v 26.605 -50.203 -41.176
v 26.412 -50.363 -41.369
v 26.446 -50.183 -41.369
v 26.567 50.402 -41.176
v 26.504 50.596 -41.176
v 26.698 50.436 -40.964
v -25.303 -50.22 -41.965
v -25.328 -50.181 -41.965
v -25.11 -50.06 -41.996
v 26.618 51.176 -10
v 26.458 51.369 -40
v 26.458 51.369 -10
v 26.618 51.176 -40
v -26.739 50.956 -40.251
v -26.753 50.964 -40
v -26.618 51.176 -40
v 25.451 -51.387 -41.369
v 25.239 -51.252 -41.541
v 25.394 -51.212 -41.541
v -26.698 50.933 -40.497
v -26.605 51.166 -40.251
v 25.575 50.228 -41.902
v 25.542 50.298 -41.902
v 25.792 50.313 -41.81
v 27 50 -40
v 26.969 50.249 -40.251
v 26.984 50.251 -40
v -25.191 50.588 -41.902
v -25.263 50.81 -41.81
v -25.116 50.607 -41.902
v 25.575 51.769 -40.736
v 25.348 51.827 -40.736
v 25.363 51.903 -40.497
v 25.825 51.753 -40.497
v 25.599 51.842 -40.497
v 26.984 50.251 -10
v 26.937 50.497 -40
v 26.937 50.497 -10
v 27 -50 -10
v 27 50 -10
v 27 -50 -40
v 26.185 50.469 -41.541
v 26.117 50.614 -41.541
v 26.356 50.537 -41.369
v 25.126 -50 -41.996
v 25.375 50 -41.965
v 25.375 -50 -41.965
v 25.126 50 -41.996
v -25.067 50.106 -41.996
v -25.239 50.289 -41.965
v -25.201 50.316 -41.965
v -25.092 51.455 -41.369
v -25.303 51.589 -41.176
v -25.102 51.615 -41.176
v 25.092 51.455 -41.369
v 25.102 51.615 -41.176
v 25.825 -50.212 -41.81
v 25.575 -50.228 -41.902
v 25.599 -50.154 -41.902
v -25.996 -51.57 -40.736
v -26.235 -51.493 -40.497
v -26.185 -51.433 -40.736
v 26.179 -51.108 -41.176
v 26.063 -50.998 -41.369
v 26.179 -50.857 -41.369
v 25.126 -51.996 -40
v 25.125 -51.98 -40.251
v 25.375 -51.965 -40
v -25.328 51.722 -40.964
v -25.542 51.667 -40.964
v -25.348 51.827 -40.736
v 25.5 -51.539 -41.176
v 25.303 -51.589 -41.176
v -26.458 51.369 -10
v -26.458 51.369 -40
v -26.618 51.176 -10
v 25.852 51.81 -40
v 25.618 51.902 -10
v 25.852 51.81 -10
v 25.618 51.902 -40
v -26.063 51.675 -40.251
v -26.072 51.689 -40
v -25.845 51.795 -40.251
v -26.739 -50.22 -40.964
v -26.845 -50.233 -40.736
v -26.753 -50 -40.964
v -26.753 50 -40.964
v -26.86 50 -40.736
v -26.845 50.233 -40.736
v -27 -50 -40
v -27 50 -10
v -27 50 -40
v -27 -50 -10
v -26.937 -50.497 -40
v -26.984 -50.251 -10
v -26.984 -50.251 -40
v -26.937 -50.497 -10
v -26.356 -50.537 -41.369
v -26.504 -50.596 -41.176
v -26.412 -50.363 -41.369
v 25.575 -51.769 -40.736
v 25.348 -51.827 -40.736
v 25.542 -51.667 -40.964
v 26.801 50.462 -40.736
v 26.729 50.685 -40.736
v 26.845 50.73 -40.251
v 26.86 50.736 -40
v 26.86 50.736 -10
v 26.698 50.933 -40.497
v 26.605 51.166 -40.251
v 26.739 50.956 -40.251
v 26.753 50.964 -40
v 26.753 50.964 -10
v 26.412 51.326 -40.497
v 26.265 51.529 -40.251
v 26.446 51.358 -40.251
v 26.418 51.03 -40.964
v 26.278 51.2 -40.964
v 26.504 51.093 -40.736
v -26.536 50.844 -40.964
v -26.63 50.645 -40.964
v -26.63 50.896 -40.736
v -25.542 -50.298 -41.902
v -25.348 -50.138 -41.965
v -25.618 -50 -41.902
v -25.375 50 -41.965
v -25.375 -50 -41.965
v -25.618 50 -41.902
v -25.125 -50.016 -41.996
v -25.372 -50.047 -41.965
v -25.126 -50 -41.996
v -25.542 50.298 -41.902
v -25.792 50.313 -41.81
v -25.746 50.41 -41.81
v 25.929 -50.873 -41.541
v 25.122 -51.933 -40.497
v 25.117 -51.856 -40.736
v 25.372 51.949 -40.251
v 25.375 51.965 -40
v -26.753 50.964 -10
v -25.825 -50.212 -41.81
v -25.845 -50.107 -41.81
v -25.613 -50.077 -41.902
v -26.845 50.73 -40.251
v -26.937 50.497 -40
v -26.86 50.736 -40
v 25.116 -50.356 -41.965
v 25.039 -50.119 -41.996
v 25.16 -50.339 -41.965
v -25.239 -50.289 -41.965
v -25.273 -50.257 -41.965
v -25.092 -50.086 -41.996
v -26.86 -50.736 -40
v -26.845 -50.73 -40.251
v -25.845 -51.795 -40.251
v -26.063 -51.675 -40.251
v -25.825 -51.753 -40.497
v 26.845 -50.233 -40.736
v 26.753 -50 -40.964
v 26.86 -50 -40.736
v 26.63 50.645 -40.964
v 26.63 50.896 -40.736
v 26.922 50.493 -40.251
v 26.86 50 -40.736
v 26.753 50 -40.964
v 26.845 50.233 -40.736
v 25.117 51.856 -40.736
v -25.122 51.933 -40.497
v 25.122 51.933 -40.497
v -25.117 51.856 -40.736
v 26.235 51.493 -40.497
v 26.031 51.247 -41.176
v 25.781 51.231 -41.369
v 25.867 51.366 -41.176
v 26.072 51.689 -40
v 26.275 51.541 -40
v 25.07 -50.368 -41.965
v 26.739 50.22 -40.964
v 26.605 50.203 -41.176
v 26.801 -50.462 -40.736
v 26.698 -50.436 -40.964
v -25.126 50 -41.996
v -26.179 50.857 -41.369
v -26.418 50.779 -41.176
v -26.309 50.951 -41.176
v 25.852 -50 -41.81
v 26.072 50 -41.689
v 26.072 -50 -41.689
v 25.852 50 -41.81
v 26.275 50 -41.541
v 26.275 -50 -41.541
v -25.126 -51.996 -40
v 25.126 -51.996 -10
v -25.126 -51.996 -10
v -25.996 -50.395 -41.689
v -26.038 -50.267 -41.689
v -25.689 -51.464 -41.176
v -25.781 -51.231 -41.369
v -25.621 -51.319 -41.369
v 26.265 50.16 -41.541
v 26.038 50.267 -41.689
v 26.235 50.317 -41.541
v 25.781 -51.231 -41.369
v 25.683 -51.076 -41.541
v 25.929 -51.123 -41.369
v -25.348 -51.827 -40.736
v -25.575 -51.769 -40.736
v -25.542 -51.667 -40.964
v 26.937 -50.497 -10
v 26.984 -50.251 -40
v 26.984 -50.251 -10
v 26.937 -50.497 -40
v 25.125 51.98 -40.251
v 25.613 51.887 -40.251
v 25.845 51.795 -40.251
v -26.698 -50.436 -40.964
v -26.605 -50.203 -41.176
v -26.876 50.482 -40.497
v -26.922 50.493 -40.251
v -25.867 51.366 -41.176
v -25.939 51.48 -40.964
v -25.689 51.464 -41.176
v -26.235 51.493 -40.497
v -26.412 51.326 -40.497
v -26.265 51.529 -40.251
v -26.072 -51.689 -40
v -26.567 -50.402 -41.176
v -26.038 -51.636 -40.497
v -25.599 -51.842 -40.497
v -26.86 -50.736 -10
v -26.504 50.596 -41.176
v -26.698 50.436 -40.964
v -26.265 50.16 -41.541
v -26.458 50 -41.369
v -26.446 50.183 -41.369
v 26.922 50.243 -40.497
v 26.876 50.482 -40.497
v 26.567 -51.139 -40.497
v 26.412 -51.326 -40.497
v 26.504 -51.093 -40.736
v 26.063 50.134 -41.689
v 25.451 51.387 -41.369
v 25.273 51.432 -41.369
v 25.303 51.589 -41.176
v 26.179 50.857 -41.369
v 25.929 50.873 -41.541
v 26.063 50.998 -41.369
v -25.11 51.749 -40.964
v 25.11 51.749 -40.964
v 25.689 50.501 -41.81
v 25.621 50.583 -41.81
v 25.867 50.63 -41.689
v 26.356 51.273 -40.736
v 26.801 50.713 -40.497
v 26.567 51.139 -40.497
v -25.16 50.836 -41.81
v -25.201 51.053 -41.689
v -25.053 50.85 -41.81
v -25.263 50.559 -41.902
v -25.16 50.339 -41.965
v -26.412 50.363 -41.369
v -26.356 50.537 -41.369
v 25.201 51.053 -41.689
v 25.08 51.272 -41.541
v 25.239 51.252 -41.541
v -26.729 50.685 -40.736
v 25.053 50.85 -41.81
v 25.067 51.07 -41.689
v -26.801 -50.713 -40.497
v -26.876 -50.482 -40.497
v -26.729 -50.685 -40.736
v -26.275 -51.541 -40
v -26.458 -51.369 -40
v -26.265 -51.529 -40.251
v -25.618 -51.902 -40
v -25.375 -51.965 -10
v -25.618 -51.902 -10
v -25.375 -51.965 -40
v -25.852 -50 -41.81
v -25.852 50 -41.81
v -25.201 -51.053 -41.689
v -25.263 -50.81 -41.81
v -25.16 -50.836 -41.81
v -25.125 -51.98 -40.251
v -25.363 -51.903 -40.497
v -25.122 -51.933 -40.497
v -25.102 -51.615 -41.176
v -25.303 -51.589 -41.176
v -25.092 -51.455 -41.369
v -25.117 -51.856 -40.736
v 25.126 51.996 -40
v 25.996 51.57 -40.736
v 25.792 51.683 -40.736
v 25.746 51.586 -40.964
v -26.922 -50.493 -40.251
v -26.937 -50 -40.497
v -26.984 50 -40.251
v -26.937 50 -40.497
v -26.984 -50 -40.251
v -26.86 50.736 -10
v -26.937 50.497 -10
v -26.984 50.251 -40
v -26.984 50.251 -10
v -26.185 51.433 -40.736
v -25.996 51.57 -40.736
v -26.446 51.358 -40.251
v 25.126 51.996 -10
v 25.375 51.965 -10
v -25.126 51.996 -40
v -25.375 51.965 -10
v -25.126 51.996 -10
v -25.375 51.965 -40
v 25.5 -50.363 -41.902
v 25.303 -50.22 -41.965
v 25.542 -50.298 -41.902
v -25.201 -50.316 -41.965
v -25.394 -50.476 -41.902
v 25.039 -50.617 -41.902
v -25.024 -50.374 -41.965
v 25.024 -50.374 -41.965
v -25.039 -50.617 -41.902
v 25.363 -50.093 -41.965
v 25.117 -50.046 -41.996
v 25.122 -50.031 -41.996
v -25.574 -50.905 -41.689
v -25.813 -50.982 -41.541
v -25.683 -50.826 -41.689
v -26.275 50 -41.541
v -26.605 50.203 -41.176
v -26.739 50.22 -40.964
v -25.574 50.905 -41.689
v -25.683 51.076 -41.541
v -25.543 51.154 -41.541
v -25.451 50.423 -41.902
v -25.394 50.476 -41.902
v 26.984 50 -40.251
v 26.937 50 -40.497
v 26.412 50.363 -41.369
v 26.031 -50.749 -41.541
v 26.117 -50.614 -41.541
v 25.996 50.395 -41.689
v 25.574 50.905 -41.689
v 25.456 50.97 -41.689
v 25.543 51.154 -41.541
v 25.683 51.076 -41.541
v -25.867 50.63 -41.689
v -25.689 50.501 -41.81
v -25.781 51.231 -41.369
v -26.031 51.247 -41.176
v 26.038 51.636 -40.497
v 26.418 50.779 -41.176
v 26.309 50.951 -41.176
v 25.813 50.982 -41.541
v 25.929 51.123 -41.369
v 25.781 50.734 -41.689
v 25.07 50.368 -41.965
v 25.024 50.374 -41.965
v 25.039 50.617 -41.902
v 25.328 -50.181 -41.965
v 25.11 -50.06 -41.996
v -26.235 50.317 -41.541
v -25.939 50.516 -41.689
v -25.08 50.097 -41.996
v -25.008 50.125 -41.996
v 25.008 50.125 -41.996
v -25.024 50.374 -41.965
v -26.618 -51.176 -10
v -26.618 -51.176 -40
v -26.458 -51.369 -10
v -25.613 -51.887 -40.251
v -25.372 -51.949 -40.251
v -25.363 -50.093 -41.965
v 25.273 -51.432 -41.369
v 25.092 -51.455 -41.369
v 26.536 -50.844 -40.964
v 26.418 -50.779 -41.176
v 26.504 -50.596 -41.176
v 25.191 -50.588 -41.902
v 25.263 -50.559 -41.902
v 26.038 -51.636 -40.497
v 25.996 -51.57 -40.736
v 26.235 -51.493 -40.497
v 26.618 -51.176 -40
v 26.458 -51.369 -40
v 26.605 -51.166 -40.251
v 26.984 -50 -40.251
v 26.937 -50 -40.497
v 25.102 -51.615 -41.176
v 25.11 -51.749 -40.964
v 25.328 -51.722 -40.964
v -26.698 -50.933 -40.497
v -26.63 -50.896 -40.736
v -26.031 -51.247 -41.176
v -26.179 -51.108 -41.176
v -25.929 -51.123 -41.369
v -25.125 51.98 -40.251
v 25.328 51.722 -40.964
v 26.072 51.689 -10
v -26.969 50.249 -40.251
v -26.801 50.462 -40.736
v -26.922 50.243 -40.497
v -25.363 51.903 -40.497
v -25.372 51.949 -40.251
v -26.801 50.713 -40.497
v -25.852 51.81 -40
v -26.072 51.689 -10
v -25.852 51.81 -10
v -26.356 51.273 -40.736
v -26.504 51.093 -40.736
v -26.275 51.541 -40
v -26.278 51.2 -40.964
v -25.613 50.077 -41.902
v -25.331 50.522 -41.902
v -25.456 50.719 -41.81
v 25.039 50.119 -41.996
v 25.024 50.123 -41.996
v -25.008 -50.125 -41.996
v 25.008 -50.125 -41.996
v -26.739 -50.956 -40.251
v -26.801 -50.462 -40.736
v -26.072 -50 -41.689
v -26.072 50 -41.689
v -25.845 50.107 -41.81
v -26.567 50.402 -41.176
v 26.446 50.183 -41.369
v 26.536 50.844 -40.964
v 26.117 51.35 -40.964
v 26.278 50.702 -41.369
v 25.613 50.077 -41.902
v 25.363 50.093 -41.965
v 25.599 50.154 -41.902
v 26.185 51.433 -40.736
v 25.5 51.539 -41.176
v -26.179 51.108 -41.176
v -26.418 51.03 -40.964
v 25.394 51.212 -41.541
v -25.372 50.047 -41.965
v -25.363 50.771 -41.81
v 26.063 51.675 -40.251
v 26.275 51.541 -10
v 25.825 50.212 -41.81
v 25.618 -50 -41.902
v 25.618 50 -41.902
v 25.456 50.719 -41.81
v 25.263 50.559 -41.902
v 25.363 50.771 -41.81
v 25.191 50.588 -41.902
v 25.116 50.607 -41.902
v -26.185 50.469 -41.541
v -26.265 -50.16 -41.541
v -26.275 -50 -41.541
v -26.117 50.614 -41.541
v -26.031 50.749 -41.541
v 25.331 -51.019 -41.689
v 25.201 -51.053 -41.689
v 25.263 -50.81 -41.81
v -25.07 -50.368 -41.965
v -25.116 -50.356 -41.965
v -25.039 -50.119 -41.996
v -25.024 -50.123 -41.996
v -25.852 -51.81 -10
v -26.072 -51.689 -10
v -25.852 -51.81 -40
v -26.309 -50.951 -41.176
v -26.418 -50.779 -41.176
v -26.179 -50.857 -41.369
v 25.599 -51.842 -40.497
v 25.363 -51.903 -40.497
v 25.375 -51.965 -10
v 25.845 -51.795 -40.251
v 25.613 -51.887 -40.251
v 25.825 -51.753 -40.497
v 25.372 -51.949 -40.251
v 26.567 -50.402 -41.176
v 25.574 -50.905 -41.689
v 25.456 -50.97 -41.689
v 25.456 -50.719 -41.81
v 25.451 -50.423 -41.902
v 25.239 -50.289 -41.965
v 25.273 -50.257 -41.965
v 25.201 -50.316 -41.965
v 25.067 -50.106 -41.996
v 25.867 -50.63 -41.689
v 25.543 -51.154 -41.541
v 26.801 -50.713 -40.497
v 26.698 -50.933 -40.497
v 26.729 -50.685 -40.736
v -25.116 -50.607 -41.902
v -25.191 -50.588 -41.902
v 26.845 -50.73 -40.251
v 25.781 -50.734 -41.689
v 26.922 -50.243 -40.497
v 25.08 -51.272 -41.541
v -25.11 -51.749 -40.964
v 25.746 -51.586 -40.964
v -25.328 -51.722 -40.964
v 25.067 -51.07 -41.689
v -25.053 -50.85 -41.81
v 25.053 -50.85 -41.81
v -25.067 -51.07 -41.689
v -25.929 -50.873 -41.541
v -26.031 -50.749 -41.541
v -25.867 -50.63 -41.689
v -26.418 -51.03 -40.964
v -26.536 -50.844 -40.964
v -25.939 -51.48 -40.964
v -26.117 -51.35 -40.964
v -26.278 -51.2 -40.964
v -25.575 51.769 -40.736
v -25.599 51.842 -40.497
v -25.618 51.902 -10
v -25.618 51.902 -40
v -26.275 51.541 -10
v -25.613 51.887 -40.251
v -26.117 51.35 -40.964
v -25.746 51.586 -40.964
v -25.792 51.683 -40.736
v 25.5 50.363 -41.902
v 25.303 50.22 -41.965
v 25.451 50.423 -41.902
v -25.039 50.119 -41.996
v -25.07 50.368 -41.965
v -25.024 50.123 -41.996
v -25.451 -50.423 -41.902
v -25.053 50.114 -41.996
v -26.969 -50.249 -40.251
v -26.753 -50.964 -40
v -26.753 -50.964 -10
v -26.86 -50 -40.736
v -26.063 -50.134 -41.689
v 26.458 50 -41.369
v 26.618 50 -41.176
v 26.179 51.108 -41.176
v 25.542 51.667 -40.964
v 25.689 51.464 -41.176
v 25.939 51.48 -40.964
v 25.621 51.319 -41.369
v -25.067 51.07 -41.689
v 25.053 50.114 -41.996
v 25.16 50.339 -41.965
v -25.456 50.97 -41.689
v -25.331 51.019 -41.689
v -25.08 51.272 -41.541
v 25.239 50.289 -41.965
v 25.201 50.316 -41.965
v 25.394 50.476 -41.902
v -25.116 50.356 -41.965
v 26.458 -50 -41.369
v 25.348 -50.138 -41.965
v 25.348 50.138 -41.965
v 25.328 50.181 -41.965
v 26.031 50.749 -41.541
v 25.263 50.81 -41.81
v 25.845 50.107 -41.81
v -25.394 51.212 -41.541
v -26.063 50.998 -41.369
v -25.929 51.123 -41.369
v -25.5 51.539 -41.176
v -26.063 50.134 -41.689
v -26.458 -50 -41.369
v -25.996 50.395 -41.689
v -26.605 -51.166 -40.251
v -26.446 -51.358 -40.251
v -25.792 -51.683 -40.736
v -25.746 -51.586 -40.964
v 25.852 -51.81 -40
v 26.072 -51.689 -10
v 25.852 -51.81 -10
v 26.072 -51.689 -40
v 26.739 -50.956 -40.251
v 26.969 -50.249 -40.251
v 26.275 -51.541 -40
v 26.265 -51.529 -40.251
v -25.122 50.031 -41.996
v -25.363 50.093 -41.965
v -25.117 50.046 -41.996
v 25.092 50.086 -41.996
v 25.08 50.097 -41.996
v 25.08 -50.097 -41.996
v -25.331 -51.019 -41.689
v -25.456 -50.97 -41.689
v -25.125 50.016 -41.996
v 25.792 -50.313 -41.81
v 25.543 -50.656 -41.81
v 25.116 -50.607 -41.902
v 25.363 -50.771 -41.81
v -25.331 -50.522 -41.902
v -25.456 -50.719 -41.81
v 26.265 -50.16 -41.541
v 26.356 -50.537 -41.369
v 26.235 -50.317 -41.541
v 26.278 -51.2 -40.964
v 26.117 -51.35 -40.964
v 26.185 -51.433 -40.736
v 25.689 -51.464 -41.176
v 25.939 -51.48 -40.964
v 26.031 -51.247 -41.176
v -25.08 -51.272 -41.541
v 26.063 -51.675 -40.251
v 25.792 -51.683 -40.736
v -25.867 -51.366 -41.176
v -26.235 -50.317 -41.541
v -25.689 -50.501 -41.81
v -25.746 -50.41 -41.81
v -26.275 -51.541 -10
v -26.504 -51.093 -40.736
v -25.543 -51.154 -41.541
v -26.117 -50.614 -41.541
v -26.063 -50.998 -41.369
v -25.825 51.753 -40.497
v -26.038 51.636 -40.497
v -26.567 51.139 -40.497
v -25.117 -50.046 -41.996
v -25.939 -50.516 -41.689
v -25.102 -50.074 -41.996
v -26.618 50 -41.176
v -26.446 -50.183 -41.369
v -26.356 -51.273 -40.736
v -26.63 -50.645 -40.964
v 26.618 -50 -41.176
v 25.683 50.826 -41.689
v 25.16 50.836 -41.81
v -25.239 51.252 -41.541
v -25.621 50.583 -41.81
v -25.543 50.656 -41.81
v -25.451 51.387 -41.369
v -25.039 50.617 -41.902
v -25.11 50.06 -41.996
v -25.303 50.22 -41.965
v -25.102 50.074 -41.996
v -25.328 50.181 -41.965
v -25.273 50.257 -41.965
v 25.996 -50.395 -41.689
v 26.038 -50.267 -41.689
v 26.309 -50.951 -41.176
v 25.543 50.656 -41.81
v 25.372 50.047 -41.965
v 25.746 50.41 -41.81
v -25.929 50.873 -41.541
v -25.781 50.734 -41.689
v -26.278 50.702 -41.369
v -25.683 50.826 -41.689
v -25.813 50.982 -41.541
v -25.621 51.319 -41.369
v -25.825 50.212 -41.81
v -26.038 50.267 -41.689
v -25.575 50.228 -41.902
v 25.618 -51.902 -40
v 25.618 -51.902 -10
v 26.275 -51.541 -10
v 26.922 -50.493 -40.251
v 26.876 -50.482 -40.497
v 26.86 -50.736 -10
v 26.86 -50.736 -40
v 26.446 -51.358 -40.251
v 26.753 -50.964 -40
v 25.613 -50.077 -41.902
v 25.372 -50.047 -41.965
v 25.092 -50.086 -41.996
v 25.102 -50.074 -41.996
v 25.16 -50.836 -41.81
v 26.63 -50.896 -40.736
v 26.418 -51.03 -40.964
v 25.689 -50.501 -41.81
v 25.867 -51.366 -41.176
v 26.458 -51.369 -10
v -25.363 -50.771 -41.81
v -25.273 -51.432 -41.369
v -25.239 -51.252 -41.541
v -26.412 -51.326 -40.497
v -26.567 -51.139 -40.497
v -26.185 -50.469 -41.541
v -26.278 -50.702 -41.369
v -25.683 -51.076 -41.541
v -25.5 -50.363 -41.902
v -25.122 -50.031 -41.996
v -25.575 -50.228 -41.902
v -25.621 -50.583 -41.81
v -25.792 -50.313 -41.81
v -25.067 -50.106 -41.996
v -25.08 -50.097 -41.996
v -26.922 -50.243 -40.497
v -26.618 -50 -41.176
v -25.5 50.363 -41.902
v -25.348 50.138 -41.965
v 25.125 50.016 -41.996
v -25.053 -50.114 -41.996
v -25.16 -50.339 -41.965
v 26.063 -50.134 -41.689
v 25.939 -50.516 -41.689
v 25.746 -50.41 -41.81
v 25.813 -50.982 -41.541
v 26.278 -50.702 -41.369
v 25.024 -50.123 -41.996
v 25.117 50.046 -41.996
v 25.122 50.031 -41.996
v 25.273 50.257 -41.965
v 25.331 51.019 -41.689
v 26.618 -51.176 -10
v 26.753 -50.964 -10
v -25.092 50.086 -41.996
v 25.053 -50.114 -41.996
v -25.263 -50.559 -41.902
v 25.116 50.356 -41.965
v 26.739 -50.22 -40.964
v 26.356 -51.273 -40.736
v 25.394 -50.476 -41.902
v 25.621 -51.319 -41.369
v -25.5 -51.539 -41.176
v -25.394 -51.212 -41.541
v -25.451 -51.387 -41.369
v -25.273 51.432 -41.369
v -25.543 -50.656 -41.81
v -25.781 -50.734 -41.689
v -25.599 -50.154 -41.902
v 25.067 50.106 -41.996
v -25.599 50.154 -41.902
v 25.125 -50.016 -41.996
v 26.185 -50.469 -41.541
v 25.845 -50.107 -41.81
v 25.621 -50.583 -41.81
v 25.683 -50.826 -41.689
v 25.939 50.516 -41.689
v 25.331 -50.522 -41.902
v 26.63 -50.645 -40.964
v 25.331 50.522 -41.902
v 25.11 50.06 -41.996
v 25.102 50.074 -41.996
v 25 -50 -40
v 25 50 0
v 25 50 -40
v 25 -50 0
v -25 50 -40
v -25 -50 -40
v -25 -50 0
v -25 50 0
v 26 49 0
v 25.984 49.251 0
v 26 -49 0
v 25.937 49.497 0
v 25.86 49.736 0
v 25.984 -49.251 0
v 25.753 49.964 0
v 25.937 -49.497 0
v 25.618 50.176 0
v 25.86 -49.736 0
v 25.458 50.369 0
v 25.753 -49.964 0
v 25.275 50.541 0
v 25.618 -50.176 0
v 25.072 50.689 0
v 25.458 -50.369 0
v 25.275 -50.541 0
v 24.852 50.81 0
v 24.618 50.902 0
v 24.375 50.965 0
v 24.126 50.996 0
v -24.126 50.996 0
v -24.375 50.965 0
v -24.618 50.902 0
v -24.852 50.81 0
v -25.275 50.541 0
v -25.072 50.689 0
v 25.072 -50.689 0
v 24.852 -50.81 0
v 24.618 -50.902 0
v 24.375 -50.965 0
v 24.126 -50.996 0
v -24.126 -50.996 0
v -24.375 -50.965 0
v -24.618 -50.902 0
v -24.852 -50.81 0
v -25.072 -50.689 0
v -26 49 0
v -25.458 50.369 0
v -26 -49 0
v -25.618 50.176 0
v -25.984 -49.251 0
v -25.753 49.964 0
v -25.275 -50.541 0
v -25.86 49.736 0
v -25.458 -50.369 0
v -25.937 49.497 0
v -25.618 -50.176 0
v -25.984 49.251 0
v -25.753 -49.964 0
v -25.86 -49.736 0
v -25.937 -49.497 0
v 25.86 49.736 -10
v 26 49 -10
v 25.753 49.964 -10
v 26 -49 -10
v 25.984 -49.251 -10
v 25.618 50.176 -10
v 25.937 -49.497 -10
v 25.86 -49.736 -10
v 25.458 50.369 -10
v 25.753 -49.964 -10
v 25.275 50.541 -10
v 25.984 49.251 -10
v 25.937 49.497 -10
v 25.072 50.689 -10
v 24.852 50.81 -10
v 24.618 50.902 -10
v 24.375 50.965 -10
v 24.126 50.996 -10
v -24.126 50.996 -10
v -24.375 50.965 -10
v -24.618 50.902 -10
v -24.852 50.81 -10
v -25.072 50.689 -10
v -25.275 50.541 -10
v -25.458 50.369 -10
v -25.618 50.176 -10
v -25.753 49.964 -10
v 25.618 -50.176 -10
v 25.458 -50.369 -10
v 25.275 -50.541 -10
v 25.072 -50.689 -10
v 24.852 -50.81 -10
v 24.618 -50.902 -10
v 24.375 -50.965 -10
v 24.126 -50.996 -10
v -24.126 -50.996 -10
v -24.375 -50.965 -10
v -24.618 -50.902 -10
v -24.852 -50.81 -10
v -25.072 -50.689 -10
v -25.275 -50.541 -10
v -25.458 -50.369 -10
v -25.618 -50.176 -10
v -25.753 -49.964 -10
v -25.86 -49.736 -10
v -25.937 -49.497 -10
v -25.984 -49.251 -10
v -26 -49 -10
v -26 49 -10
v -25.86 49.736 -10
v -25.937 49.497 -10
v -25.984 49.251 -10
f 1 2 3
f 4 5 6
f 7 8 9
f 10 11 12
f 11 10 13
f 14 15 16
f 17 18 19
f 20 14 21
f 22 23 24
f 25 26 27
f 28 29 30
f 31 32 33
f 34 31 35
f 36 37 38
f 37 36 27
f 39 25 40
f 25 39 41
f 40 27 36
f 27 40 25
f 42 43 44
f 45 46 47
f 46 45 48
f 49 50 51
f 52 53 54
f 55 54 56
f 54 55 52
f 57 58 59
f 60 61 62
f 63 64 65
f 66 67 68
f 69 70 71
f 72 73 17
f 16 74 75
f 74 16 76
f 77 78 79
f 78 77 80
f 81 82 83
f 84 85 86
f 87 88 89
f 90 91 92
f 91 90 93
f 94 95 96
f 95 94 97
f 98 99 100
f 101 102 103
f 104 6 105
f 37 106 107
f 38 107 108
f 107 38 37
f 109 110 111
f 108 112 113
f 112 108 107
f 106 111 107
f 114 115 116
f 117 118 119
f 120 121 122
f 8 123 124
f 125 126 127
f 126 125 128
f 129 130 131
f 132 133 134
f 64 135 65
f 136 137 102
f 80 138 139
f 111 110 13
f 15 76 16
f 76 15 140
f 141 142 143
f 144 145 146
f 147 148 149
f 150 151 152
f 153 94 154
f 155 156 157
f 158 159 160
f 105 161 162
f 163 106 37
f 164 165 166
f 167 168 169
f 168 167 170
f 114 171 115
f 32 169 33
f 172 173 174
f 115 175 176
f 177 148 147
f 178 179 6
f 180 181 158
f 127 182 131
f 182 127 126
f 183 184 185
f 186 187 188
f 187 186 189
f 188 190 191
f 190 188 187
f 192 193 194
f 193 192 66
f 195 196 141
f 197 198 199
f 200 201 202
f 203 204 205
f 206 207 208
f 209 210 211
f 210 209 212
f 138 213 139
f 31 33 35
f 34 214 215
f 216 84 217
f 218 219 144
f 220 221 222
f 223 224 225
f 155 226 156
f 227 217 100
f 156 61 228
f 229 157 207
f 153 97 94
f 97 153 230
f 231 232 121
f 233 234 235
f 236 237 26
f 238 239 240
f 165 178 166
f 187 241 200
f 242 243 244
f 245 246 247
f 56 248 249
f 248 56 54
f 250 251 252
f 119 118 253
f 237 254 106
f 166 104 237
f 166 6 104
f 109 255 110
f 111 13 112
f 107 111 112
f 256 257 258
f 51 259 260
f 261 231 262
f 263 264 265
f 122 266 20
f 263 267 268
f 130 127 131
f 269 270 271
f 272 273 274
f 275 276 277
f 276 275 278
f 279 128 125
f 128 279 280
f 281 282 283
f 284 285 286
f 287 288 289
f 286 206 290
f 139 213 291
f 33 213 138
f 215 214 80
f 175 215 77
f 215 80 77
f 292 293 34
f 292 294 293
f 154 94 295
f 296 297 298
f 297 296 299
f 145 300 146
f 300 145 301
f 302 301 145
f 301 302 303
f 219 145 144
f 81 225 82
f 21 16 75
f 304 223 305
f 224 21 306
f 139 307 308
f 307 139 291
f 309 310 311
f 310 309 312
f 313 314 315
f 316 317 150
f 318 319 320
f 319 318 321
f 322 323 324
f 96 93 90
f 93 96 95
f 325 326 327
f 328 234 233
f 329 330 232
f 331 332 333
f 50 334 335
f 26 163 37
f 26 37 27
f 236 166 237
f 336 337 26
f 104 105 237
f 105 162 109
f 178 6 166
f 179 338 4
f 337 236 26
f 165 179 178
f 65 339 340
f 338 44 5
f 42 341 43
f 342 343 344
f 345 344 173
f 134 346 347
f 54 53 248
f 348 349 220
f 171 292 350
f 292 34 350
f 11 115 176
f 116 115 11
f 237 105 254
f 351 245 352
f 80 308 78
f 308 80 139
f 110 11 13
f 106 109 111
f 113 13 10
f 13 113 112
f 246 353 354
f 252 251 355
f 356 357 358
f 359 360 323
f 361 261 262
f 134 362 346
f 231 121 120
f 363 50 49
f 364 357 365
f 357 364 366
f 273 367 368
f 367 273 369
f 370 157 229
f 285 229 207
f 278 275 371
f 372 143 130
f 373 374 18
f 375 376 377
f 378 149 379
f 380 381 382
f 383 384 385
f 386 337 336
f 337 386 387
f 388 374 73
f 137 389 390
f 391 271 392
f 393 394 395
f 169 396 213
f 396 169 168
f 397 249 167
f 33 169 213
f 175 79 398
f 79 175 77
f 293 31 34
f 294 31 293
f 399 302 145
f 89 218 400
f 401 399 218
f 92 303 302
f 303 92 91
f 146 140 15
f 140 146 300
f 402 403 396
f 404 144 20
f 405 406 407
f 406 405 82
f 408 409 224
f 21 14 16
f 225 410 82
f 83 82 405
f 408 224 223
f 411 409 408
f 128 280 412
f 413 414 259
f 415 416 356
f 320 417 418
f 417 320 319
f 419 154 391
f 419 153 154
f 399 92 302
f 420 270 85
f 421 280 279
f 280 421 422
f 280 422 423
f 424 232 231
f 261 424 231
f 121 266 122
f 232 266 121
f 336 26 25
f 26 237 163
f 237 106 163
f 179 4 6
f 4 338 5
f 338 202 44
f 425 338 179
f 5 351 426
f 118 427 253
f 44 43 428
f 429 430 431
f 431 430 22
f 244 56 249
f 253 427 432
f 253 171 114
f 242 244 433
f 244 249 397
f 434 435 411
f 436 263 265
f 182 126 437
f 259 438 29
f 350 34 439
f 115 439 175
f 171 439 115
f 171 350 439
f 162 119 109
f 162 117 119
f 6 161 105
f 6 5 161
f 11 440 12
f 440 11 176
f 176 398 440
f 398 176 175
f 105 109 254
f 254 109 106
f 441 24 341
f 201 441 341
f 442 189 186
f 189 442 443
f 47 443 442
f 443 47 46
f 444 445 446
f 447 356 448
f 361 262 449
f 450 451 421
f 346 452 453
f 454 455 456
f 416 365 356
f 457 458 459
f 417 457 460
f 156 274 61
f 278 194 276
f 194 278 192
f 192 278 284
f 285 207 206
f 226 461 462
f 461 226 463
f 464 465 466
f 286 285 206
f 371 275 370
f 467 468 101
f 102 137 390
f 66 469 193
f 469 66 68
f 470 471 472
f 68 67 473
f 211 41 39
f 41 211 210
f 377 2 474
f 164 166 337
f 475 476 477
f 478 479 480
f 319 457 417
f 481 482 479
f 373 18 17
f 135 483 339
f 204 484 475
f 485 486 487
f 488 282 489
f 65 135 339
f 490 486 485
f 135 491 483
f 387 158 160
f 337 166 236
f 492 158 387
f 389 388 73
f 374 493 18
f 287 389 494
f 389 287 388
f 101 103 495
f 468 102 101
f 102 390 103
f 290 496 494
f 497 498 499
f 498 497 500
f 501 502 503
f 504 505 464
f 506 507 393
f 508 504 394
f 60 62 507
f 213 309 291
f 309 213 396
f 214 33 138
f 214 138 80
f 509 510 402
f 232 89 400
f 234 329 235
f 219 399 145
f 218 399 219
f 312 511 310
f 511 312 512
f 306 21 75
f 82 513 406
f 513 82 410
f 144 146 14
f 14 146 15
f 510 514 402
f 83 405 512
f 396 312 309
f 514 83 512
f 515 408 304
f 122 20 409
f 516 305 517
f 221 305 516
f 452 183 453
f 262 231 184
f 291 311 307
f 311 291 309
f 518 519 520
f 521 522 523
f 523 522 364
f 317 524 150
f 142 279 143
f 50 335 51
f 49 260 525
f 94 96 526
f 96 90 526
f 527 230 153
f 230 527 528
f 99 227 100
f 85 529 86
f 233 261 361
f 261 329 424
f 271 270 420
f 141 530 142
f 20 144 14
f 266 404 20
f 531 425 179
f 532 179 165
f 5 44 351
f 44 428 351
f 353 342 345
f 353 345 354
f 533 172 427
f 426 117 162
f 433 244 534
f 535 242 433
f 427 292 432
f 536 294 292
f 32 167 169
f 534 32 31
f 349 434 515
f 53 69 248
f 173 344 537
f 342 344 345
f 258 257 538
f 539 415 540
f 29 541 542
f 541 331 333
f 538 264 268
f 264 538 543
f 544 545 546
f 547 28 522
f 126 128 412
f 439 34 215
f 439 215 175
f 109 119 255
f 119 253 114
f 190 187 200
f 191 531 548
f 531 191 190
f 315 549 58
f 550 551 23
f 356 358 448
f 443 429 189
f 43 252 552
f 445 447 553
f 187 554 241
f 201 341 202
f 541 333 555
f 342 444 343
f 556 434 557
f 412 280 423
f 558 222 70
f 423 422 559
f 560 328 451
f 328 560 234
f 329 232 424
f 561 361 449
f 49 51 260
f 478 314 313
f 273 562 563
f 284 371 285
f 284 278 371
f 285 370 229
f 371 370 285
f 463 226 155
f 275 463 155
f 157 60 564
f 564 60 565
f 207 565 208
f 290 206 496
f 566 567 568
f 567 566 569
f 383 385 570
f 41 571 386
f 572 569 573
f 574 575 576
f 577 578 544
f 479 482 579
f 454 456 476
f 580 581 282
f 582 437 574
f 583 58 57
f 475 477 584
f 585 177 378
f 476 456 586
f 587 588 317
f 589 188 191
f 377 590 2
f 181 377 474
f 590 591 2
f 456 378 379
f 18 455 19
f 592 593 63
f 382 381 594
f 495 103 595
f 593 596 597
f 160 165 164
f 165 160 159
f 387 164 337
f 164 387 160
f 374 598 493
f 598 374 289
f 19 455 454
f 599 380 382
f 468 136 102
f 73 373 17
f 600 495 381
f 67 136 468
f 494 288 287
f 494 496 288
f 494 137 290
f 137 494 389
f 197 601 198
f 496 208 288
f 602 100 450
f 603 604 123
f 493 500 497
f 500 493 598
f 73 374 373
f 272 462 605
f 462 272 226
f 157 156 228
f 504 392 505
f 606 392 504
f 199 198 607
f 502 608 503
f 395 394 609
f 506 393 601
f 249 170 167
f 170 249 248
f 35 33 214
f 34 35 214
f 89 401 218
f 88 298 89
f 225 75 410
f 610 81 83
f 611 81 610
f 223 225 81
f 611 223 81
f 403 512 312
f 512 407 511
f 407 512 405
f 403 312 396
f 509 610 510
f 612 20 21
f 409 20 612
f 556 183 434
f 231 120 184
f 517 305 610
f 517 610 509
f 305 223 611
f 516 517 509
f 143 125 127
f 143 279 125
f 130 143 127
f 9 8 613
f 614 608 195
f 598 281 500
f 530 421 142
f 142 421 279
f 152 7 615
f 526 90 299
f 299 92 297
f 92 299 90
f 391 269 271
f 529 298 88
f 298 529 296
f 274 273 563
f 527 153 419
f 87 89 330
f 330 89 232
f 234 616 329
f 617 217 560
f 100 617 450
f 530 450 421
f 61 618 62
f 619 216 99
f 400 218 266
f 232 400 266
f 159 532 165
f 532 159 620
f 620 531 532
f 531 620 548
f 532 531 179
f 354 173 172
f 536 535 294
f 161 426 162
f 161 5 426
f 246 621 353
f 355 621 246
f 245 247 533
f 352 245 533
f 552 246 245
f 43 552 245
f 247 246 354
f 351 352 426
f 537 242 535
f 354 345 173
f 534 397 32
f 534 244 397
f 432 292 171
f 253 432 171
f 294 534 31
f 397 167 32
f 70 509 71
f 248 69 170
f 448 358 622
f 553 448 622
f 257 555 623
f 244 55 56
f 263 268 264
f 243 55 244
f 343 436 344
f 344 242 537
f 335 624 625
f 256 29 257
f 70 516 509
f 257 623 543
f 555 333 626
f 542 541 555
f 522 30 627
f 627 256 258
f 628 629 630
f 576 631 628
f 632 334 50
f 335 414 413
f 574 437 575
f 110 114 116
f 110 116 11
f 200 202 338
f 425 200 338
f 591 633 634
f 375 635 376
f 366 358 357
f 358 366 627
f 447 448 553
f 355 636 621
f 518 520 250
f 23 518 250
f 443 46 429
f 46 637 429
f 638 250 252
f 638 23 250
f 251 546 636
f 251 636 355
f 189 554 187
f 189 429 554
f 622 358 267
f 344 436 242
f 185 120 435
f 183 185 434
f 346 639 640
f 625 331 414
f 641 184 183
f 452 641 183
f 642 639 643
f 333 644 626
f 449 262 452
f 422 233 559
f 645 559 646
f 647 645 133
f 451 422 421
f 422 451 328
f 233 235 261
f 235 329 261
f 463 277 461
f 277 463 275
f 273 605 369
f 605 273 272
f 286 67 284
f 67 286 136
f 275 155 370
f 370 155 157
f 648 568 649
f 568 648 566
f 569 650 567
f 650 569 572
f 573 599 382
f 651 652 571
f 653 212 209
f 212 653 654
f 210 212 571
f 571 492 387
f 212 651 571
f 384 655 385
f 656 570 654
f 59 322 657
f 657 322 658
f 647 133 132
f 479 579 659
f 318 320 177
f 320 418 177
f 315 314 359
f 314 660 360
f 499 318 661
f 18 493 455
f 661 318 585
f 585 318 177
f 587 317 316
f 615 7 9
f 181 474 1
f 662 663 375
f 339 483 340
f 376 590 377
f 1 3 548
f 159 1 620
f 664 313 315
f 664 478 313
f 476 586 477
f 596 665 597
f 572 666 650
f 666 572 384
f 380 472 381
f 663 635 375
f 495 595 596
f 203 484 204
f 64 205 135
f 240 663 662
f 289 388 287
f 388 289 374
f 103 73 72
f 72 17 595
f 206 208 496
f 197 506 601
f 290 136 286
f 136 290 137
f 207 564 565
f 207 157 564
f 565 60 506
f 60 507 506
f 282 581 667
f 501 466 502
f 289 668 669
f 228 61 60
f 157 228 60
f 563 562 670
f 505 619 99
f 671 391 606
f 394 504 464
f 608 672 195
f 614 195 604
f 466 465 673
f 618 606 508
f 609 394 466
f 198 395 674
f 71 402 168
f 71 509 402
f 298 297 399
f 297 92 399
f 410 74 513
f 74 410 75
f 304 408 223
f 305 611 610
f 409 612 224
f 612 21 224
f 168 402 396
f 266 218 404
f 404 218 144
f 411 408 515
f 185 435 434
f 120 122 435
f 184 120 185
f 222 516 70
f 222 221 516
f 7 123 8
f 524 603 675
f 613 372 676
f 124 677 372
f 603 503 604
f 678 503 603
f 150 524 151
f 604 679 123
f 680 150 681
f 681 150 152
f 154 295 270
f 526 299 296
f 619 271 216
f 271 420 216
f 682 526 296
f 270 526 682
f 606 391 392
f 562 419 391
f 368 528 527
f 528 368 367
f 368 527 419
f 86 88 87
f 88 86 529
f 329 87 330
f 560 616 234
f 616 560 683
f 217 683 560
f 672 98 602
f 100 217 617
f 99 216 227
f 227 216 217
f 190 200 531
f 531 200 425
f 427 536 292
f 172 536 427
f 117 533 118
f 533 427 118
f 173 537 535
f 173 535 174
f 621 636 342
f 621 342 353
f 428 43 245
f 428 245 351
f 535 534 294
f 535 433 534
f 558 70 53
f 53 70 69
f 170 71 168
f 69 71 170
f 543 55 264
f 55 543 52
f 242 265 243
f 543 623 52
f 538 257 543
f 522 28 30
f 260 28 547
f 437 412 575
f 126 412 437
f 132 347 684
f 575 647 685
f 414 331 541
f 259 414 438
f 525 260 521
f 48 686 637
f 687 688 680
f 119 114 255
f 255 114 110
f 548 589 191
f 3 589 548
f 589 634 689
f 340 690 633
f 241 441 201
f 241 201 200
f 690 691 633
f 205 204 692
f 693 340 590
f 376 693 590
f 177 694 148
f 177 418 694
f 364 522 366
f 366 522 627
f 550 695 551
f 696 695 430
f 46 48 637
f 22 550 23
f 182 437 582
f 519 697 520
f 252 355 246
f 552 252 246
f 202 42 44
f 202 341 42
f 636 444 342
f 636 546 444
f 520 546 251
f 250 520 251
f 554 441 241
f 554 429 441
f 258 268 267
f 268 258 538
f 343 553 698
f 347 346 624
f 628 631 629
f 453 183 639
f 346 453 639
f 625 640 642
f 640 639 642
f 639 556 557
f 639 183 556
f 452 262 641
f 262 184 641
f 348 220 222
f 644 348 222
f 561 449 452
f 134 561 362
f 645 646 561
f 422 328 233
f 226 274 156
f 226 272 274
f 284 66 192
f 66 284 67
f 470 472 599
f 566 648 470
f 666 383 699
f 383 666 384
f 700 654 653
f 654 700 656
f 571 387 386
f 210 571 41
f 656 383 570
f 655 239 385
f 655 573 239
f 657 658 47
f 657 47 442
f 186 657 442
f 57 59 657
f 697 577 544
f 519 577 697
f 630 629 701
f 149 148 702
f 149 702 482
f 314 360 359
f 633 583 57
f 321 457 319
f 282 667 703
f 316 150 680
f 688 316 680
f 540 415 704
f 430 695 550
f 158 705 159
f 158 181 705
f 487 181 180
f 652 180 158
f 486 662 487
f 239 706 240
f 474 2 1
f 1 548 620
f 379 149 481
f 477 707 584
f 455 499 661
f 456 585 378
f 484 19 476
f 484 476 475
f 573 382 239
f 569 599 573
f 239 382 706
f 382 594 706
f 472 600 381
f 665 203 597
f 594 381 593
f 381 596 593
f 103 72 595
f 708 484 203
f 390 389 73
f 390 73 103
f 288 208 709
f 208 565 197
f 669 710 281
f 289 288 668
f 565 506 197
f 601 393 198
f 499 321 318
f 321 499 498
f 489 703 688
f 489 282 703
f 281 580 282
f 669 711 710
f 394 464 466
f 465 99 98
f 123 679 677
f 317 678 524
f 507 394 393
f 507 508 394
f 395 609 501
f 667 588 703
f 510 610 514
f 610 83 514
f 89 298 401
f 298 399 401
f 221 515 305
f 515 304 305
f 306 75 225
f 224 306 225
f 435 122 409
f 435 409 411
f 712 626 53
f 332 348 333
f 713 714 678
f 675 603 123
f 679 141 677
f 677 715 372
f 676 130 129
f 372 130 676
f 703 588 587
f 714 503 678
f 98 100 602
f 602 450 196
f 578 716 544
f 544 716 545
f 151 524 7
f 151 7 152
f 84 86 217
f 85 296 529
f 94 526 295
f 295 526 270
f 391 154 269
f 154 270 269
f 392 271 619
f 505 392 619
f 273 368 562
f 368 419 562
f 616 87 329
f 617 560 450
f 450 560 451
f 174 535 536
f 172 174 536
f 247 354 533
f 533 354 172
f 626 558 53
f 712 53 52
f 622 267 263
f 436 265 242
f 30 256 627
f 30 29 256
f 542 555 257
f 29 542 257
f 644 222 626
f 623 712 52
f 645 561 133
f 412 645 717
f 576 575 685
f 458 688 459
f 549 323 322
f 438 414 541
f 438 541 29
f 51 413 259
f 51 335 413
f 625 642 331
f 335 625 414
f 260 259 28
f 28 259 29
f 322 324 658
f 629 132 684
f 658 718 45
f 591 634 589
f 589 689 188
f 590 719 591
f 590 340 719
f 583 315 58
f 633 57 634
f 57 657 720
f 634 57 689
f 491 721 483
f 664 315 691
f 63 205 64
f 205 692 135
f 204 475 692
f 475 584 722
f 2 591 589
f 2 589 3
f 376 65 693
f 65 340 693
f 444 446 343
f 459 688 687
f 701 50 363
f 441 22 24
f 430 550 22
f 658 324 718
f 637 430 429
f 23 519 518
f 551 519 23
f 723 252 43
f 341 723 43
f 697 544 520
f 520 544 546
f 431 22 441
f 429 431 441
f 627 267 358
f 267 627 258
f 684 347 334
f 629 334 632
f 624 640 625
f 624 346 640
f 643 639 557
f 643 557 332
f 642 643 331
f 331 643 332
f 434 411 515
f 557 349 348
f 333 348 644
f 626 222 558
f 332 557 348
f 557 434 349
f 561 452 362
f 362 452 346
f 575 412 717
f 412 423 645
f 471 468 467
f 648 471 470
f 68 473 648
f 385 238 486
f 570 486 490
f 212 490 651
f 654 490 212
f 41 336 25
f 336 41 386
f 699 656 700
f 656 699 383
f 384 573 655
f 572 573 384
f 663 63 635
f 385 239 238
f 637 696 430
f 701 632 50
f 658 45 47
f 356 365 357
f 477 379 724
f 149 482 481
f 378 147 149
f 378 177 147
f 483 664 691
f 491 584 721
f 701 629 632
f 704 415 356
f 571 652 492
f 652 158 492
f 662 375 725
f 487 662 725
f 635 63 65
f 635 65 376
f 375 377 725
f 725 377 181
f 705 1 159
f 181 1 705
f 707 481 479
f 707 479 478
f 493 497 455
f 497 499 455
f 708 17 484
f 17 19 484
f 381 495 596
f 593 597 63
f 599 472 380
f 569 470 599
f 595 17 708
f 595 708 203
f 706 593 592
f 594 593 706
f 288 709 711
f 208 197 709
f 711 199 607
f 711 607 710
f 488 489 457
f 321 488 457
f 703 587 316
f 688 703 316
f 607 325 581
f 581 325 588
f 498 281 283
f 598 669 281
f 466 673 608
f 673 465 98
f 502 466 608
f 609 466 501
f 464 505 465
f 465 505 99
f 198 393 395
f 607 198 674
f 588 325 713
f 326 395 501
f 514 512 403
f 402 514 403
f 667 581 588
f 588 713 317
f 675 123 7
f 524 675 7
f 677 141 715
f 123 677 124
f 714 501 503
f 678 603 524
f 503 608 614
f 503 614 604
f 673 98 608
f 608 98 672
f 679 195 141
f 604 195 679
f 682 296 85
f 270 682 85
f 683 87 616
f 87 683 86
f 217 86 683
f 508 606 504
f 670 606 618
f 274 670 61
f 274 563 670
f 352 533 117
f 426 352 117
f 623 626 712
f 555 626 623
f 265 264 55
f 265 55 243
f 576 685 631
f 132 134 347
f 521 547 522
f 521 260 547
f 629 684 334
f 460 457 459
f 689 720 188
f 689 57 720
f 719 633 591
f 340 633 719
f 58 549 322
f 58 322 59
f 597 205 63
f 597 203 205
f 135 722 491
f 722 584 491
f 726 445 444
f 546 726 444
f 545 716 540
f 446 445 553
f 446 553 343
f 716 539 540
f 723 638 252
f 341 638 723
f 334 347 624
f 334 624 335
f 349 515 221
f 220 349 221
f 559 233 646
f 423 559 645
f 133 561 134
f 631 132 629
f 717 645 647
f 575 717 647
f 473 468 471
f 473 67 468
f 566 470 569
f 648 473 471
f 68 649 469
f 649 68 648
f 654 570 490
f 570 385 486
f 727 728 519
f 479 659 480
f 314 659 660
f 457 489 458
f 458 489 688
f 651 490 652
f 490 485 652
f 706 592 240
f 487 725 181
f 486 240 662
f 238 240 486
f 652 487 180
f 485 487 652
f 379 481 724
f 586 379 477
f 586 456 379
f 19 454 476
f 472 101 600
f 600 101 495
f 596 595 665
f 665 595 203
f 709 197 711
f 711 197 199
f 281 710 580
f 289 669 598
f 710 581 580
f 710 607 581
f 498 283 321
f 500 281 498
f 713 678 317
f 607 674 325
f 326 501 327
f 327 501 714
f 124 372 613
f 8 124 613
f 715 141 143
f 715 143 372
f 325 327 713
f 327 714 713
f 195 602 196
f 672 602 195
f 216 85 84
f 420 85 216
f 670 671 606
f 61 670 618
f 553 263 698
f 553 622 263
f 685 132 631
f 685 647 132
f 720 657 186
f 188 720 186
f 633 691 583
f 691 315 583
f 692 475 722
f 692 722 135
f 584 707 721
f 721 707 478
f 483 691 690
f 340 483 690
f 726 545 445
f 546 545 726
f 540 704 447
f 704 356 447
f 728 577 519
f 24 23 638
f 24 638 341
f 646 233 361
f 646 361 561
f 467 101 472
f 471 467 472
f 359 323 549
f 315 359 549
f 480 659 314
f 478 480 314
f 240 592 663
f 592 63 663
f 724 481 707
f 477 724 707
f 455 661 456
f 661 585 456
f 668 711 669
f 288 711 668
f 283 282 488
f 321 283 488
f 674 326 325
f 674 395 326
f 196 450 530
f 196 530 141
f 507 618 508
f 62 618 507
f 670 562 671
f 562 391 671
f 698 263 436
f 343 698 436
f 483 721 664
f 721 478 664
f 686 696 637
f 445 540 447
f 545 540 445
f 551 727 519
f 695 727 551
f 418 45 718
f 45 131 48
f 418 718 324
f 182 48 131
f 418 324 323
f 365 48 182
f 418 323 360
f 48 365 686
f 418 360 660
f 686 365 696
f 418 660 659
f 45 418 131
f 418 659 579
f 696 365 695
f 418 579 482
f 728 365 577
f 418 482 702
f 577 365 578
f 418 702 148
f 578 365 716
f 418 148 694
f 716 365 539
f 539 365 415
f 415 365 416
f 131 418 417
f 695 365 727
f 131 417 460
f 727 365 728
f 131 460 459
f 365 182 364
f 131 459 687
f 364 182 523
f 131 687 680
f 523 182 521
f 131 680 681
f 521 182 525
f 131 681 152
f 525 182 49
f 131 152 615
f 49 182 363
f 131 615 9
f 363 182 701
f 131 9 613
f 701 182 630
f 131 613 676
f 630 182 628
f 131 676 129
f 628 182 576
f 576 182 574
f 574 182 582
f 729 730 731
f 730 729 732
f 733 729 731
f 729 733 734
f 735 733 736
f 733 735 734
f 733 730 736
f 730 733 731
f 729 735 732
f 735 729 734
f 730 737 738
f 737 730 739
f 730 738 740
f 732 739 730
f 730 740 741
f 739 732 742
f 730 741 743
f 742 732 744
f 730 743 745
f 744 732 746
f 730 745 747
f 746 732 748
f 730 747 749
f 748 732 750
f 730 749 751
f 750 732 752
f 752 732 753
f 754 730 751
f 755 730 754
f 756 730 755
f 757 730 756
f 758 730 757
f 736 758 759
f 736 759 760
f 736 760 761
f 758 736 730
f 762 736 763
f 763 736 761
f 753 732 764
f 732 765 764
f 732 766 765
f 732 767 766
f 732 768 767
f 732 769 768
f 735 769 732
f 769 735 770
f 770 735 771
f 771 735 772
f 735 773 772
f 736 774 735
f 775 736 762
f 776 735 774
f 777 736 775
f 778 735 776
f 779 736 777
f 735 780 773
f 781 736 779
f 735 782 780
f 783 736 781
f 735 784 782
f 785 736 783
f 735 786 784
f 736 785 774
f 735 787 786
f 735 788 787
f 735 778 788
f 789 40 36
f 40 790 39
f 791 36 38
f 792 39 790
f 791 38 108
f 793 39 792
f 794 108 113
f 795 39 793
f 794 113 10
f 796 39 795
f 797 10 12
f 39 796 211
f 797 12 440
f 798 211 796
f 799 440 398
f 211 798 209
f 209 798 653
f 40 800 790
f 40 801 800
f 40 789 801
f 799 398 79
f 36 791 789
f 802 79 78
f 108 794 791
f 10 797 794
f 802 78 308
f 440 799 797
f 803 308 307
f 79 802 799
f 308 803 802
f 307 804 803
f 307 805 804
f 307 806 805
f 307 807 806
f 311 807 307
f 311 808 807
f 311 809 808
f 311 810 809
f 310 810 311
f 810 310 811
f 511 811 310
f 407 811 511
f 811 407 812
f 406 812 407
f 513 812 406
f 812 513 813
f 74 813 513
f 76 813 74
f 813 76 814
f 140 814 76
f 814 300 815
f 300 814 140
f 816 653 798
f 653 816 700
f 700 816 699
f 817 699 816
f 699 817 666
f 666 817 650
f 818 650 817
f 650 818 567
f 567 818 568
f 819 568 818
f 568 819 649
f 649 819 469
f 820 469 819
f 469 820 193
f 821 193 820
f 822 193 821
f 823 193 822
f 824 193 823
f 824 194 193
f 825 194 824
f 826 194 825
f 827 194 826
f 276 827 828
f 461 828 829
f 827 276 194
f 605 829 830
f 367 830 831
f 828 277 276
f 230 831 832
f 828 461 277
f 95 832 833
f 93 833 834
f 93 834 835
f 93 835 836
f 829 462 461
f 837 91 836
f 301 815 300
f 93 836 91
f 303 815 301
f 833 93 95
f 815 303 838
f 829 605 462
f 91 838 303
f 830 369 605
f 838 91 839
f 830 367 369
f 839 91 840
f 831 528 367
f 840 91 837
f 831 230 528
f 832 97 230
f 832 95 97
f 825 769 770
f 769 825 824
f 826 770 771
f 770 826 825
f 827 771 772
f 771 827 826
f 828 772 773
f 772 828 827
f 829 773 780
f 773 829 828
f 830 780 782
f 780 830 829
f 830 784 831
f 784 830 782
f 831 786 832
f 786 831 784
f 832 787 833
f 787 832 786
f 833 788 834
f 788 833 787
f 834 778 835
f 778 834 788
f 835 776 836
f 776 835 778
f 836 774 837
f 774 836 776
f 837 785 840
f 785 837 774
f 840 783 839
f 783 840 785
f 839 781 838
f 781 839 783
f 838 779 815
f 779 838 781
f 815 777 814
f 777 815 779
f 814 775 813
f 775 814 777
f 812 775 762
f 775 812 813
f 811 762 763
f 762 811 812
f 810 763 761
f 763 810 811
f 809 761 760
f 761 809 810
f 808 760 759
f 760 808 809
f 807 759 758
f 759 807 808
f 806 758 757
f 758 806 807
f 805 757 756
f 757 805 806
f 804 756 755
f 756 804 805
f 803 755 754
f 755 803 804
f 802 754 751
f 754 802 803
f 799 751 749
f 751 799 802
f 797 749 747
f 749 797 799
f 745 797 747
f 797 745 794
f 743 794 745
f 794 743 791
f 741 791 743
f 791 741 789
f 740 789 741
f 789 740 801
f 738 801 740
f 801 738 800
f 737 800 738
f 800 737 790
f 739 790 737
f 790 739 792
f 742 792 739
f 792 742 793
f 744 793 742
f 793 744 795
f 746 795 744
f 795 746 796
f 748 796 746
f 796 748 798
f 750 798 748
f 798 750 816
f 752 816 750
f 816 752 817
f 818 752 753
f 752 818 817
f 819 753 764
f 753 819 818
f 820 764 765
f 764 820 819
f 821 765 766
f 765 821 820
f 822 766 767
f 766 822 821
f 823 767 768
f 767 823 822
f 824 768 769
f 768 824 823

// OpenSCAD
/* The box */
/* [Main] */
show = "box"; // [box:Box, lid:Lid]
width = 50;
length = 100;
height = 40;
/* [Secondary] */
wallThikness = 2;
$fn = 50;

module box() {
    difference(){
        minkowski(){
            cube([width,length,height*2],true);
            sphere(wallThikness);
        }
        translate([0,0,wallThikness/2])
        cube([width,length,height*2+wallThikness],true);
        translate([0,0,height])
        cube([width+wallThikness*2,length+wallThikness*2,height*2],true);
    
        translate([0,0,-10])
        linear_extrude(10)
        difference(){
            
            square([width+wallThikness*2,length+wallThikness*2],true);
            minkowski(){
            square([width-wallThikness,length-wallThikness],true);
                circle(wallThikness);
            }
        }
    }
}


module lid(){
    difference(){
        #minkowski(){
            cube([width,length,40],true);
            sphere(wallThikness);
        }
        translate([0,0,-20])
        cube([width+wallThikness*2,length+wallThikness*2,40],true);
        translate([0,0,-wallThikness/2])///
        minkowski(){
            cube([width-wallThikness,length-wallThikness,20+wallThikness],true);
            sphere(wallThikness);
        }
        translate([0,0,-wallThikness/2])////
        minkowski(){
            cube([width-wallThikness*2,length-wallThikness*2,40-wallThikness],true);
            sphere(wallThikness);
        }
    }
    
}

if (show == "box")
    box();
else if (show == "lid")
    lid();
